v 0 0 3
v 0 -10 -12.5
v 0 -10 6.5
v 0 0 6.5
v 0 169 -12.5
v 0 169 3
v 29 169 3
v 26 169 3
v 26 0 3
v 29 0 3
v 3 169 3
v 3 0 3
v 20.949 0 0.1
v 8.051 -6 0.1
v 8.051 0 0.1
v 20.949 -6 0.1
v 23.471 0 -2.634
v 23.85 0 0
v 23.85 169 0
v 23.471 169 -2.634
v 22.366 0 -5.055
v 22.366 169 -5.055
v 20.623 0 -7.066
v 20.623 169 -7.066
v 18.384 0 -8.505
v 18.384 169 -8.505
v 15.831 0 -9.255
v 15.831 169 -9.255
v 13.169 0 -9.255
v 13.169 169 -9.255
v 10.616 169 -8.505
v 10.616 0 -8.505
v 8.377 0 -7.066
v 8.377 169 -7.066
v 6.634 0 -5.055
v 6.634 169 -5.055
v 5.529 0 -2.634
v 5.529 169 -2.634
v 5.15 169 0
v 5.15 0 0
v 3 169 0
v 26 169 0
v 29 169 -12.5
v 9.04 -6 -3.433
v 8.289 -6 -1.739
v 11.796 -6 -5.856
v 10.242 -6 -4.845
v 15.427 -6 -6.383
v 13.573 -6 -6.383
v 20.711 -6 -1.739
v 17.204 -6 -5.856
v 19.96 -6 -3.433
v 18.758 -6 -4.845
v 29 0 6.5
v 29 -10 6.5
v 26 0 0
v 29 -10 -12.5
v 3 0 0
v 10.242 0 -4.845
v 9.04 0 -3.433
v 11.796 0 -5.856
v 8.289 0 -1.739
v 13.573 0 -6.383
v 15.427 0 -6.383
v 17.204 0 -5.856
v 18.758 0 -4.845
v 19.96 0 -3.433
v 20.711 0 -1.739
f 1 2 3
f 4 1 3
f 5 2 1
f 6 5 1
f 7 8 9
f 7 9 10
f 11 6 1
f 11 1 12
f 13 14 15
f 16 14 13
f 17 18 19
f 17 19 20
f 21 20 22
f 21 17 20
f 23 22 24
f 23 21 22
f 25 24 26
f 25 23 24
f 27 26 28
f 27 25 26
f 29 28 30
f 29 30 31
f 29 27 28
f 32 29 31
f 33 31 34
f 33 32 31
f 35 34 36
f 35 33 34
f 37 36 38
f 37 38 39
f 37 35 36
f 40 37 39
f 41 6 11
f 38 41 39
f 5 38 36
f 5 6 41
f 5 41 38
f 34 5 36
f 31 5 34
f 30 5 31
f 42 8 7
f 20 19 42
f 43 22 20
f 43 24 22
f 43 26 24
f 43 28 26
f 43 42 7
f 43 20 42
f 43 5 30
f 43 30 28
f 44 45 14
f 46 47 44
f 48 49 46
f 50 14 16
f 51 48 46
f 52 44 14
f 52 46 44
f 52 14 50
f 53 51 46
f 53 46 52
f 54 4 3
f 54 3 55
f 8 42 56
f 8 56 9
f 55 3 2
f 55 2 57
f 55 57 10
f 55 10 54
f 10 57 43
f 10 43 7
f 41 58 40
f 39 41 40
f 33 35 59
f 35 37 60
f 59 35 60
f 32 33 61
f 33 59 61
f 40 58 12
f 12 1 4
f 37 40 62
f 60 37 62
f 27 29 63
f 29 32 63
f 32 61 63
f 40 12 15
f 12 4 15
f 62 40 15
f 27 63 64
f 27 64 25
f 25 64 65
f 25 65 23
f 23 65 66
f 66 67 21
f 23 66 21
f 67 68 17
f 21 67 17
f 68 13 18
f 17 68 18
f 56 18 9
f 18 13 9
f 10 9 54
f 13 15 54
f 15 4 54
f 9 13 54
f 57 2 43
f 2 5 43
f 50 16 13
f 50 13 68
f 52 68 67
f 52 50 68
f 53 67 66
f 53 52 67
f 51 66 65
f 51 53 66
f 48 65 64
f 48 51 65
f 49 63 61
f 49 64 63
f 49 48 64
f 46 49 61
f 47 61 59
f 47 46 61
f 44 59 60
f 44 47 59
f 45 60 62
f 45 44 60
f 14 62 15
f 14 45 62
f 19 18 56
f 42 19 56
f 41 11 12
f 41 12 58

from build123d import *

# Parameters (mm, degrees)
MOLD_BLOCK_WITH_RIDGES_DEPTH  = 169
SKETCH2_W                     = 29
SKETCH2_H                     = 19
BOTTOM_LEDGE_DEPTH            = 10
ROD_ALIGNMENT_HOLE_DEPTH      = 2
ROD_ALIGNMENT_HOLE_DEPTH_BACK = 6
SUBTRACT_ACTUATOR_DEPTH       = 169


# Read off the part's stored shape, not the designer's step: subtract actuator
with BuildPart() as part:
    # Sketch1 → mold block with ridges (new body)
    with BuildSketch(Plane(origin=(0, 0, 0), x_dir=(1, 0, 0), z_dir=(0, 1, 0))):
        Polygon((3, 0), (26, 0), (26, -3), (29, -3), (29, 2.5), (29, 12.5), (0, 12.5), (0, 0), (0, -3), (3, -3), align=None)
    extrude(amount=MOLD_BLOCK_WITH_RIDGES_DEPTH)

    # Sketch2 → bottom ledge (add)
    with BuildSketch(Plane.XZ):
        with Locations((14.5, -3)):
            Rectangle(SKETCH2_W, SKETCH2_H)
    extrude(amount=BOTTOM_LEDGE_DEPTH)

    # Sketch3 → rod alignment hole (cut, two sides: drawn at the far end of the back side and taken through both)
    with BuildSketch(Plane(origin=(0, 0, 0), x_dir=(1, 0, 0), z_dir=(0, 1, 0)).offset(-ROD_ALIGNMENT_HOLE_DEPTH_BACK)):
        with BuildLine():
            Line((8.05077524, -0.1), (20.94922476, -0.1))
            ThreePointArc((20.94922476, -0.1), (14.5, 6.45), (8.05077524, -0.1))
        make_face()
    extrude(amount=ROD_ALIGNMENT_HOLE_DEPTH + ROD_ALIGNMENT_HOLE_DEPTH_BACK, mode=Mode.SUBTRACT)

    # subtract actuator outline → subtract actuator (cut)
    with BuildSketch(Plane(origin=(0, 0, 0), x_dir=(1, 0, 0), z_dir=(0, 1, 0))):
        with BuildLine():
            ThreePointArc((23.85, 0), (14.5, 9.35), (5.15, 0))
            Line((5.15, 0), (23.85, 0))
        make_face()
    extrude(amount=SUBTRACT_ACTUATOR_DEPTH, mode=Mode.SUBTRACT)


solid = part.part
